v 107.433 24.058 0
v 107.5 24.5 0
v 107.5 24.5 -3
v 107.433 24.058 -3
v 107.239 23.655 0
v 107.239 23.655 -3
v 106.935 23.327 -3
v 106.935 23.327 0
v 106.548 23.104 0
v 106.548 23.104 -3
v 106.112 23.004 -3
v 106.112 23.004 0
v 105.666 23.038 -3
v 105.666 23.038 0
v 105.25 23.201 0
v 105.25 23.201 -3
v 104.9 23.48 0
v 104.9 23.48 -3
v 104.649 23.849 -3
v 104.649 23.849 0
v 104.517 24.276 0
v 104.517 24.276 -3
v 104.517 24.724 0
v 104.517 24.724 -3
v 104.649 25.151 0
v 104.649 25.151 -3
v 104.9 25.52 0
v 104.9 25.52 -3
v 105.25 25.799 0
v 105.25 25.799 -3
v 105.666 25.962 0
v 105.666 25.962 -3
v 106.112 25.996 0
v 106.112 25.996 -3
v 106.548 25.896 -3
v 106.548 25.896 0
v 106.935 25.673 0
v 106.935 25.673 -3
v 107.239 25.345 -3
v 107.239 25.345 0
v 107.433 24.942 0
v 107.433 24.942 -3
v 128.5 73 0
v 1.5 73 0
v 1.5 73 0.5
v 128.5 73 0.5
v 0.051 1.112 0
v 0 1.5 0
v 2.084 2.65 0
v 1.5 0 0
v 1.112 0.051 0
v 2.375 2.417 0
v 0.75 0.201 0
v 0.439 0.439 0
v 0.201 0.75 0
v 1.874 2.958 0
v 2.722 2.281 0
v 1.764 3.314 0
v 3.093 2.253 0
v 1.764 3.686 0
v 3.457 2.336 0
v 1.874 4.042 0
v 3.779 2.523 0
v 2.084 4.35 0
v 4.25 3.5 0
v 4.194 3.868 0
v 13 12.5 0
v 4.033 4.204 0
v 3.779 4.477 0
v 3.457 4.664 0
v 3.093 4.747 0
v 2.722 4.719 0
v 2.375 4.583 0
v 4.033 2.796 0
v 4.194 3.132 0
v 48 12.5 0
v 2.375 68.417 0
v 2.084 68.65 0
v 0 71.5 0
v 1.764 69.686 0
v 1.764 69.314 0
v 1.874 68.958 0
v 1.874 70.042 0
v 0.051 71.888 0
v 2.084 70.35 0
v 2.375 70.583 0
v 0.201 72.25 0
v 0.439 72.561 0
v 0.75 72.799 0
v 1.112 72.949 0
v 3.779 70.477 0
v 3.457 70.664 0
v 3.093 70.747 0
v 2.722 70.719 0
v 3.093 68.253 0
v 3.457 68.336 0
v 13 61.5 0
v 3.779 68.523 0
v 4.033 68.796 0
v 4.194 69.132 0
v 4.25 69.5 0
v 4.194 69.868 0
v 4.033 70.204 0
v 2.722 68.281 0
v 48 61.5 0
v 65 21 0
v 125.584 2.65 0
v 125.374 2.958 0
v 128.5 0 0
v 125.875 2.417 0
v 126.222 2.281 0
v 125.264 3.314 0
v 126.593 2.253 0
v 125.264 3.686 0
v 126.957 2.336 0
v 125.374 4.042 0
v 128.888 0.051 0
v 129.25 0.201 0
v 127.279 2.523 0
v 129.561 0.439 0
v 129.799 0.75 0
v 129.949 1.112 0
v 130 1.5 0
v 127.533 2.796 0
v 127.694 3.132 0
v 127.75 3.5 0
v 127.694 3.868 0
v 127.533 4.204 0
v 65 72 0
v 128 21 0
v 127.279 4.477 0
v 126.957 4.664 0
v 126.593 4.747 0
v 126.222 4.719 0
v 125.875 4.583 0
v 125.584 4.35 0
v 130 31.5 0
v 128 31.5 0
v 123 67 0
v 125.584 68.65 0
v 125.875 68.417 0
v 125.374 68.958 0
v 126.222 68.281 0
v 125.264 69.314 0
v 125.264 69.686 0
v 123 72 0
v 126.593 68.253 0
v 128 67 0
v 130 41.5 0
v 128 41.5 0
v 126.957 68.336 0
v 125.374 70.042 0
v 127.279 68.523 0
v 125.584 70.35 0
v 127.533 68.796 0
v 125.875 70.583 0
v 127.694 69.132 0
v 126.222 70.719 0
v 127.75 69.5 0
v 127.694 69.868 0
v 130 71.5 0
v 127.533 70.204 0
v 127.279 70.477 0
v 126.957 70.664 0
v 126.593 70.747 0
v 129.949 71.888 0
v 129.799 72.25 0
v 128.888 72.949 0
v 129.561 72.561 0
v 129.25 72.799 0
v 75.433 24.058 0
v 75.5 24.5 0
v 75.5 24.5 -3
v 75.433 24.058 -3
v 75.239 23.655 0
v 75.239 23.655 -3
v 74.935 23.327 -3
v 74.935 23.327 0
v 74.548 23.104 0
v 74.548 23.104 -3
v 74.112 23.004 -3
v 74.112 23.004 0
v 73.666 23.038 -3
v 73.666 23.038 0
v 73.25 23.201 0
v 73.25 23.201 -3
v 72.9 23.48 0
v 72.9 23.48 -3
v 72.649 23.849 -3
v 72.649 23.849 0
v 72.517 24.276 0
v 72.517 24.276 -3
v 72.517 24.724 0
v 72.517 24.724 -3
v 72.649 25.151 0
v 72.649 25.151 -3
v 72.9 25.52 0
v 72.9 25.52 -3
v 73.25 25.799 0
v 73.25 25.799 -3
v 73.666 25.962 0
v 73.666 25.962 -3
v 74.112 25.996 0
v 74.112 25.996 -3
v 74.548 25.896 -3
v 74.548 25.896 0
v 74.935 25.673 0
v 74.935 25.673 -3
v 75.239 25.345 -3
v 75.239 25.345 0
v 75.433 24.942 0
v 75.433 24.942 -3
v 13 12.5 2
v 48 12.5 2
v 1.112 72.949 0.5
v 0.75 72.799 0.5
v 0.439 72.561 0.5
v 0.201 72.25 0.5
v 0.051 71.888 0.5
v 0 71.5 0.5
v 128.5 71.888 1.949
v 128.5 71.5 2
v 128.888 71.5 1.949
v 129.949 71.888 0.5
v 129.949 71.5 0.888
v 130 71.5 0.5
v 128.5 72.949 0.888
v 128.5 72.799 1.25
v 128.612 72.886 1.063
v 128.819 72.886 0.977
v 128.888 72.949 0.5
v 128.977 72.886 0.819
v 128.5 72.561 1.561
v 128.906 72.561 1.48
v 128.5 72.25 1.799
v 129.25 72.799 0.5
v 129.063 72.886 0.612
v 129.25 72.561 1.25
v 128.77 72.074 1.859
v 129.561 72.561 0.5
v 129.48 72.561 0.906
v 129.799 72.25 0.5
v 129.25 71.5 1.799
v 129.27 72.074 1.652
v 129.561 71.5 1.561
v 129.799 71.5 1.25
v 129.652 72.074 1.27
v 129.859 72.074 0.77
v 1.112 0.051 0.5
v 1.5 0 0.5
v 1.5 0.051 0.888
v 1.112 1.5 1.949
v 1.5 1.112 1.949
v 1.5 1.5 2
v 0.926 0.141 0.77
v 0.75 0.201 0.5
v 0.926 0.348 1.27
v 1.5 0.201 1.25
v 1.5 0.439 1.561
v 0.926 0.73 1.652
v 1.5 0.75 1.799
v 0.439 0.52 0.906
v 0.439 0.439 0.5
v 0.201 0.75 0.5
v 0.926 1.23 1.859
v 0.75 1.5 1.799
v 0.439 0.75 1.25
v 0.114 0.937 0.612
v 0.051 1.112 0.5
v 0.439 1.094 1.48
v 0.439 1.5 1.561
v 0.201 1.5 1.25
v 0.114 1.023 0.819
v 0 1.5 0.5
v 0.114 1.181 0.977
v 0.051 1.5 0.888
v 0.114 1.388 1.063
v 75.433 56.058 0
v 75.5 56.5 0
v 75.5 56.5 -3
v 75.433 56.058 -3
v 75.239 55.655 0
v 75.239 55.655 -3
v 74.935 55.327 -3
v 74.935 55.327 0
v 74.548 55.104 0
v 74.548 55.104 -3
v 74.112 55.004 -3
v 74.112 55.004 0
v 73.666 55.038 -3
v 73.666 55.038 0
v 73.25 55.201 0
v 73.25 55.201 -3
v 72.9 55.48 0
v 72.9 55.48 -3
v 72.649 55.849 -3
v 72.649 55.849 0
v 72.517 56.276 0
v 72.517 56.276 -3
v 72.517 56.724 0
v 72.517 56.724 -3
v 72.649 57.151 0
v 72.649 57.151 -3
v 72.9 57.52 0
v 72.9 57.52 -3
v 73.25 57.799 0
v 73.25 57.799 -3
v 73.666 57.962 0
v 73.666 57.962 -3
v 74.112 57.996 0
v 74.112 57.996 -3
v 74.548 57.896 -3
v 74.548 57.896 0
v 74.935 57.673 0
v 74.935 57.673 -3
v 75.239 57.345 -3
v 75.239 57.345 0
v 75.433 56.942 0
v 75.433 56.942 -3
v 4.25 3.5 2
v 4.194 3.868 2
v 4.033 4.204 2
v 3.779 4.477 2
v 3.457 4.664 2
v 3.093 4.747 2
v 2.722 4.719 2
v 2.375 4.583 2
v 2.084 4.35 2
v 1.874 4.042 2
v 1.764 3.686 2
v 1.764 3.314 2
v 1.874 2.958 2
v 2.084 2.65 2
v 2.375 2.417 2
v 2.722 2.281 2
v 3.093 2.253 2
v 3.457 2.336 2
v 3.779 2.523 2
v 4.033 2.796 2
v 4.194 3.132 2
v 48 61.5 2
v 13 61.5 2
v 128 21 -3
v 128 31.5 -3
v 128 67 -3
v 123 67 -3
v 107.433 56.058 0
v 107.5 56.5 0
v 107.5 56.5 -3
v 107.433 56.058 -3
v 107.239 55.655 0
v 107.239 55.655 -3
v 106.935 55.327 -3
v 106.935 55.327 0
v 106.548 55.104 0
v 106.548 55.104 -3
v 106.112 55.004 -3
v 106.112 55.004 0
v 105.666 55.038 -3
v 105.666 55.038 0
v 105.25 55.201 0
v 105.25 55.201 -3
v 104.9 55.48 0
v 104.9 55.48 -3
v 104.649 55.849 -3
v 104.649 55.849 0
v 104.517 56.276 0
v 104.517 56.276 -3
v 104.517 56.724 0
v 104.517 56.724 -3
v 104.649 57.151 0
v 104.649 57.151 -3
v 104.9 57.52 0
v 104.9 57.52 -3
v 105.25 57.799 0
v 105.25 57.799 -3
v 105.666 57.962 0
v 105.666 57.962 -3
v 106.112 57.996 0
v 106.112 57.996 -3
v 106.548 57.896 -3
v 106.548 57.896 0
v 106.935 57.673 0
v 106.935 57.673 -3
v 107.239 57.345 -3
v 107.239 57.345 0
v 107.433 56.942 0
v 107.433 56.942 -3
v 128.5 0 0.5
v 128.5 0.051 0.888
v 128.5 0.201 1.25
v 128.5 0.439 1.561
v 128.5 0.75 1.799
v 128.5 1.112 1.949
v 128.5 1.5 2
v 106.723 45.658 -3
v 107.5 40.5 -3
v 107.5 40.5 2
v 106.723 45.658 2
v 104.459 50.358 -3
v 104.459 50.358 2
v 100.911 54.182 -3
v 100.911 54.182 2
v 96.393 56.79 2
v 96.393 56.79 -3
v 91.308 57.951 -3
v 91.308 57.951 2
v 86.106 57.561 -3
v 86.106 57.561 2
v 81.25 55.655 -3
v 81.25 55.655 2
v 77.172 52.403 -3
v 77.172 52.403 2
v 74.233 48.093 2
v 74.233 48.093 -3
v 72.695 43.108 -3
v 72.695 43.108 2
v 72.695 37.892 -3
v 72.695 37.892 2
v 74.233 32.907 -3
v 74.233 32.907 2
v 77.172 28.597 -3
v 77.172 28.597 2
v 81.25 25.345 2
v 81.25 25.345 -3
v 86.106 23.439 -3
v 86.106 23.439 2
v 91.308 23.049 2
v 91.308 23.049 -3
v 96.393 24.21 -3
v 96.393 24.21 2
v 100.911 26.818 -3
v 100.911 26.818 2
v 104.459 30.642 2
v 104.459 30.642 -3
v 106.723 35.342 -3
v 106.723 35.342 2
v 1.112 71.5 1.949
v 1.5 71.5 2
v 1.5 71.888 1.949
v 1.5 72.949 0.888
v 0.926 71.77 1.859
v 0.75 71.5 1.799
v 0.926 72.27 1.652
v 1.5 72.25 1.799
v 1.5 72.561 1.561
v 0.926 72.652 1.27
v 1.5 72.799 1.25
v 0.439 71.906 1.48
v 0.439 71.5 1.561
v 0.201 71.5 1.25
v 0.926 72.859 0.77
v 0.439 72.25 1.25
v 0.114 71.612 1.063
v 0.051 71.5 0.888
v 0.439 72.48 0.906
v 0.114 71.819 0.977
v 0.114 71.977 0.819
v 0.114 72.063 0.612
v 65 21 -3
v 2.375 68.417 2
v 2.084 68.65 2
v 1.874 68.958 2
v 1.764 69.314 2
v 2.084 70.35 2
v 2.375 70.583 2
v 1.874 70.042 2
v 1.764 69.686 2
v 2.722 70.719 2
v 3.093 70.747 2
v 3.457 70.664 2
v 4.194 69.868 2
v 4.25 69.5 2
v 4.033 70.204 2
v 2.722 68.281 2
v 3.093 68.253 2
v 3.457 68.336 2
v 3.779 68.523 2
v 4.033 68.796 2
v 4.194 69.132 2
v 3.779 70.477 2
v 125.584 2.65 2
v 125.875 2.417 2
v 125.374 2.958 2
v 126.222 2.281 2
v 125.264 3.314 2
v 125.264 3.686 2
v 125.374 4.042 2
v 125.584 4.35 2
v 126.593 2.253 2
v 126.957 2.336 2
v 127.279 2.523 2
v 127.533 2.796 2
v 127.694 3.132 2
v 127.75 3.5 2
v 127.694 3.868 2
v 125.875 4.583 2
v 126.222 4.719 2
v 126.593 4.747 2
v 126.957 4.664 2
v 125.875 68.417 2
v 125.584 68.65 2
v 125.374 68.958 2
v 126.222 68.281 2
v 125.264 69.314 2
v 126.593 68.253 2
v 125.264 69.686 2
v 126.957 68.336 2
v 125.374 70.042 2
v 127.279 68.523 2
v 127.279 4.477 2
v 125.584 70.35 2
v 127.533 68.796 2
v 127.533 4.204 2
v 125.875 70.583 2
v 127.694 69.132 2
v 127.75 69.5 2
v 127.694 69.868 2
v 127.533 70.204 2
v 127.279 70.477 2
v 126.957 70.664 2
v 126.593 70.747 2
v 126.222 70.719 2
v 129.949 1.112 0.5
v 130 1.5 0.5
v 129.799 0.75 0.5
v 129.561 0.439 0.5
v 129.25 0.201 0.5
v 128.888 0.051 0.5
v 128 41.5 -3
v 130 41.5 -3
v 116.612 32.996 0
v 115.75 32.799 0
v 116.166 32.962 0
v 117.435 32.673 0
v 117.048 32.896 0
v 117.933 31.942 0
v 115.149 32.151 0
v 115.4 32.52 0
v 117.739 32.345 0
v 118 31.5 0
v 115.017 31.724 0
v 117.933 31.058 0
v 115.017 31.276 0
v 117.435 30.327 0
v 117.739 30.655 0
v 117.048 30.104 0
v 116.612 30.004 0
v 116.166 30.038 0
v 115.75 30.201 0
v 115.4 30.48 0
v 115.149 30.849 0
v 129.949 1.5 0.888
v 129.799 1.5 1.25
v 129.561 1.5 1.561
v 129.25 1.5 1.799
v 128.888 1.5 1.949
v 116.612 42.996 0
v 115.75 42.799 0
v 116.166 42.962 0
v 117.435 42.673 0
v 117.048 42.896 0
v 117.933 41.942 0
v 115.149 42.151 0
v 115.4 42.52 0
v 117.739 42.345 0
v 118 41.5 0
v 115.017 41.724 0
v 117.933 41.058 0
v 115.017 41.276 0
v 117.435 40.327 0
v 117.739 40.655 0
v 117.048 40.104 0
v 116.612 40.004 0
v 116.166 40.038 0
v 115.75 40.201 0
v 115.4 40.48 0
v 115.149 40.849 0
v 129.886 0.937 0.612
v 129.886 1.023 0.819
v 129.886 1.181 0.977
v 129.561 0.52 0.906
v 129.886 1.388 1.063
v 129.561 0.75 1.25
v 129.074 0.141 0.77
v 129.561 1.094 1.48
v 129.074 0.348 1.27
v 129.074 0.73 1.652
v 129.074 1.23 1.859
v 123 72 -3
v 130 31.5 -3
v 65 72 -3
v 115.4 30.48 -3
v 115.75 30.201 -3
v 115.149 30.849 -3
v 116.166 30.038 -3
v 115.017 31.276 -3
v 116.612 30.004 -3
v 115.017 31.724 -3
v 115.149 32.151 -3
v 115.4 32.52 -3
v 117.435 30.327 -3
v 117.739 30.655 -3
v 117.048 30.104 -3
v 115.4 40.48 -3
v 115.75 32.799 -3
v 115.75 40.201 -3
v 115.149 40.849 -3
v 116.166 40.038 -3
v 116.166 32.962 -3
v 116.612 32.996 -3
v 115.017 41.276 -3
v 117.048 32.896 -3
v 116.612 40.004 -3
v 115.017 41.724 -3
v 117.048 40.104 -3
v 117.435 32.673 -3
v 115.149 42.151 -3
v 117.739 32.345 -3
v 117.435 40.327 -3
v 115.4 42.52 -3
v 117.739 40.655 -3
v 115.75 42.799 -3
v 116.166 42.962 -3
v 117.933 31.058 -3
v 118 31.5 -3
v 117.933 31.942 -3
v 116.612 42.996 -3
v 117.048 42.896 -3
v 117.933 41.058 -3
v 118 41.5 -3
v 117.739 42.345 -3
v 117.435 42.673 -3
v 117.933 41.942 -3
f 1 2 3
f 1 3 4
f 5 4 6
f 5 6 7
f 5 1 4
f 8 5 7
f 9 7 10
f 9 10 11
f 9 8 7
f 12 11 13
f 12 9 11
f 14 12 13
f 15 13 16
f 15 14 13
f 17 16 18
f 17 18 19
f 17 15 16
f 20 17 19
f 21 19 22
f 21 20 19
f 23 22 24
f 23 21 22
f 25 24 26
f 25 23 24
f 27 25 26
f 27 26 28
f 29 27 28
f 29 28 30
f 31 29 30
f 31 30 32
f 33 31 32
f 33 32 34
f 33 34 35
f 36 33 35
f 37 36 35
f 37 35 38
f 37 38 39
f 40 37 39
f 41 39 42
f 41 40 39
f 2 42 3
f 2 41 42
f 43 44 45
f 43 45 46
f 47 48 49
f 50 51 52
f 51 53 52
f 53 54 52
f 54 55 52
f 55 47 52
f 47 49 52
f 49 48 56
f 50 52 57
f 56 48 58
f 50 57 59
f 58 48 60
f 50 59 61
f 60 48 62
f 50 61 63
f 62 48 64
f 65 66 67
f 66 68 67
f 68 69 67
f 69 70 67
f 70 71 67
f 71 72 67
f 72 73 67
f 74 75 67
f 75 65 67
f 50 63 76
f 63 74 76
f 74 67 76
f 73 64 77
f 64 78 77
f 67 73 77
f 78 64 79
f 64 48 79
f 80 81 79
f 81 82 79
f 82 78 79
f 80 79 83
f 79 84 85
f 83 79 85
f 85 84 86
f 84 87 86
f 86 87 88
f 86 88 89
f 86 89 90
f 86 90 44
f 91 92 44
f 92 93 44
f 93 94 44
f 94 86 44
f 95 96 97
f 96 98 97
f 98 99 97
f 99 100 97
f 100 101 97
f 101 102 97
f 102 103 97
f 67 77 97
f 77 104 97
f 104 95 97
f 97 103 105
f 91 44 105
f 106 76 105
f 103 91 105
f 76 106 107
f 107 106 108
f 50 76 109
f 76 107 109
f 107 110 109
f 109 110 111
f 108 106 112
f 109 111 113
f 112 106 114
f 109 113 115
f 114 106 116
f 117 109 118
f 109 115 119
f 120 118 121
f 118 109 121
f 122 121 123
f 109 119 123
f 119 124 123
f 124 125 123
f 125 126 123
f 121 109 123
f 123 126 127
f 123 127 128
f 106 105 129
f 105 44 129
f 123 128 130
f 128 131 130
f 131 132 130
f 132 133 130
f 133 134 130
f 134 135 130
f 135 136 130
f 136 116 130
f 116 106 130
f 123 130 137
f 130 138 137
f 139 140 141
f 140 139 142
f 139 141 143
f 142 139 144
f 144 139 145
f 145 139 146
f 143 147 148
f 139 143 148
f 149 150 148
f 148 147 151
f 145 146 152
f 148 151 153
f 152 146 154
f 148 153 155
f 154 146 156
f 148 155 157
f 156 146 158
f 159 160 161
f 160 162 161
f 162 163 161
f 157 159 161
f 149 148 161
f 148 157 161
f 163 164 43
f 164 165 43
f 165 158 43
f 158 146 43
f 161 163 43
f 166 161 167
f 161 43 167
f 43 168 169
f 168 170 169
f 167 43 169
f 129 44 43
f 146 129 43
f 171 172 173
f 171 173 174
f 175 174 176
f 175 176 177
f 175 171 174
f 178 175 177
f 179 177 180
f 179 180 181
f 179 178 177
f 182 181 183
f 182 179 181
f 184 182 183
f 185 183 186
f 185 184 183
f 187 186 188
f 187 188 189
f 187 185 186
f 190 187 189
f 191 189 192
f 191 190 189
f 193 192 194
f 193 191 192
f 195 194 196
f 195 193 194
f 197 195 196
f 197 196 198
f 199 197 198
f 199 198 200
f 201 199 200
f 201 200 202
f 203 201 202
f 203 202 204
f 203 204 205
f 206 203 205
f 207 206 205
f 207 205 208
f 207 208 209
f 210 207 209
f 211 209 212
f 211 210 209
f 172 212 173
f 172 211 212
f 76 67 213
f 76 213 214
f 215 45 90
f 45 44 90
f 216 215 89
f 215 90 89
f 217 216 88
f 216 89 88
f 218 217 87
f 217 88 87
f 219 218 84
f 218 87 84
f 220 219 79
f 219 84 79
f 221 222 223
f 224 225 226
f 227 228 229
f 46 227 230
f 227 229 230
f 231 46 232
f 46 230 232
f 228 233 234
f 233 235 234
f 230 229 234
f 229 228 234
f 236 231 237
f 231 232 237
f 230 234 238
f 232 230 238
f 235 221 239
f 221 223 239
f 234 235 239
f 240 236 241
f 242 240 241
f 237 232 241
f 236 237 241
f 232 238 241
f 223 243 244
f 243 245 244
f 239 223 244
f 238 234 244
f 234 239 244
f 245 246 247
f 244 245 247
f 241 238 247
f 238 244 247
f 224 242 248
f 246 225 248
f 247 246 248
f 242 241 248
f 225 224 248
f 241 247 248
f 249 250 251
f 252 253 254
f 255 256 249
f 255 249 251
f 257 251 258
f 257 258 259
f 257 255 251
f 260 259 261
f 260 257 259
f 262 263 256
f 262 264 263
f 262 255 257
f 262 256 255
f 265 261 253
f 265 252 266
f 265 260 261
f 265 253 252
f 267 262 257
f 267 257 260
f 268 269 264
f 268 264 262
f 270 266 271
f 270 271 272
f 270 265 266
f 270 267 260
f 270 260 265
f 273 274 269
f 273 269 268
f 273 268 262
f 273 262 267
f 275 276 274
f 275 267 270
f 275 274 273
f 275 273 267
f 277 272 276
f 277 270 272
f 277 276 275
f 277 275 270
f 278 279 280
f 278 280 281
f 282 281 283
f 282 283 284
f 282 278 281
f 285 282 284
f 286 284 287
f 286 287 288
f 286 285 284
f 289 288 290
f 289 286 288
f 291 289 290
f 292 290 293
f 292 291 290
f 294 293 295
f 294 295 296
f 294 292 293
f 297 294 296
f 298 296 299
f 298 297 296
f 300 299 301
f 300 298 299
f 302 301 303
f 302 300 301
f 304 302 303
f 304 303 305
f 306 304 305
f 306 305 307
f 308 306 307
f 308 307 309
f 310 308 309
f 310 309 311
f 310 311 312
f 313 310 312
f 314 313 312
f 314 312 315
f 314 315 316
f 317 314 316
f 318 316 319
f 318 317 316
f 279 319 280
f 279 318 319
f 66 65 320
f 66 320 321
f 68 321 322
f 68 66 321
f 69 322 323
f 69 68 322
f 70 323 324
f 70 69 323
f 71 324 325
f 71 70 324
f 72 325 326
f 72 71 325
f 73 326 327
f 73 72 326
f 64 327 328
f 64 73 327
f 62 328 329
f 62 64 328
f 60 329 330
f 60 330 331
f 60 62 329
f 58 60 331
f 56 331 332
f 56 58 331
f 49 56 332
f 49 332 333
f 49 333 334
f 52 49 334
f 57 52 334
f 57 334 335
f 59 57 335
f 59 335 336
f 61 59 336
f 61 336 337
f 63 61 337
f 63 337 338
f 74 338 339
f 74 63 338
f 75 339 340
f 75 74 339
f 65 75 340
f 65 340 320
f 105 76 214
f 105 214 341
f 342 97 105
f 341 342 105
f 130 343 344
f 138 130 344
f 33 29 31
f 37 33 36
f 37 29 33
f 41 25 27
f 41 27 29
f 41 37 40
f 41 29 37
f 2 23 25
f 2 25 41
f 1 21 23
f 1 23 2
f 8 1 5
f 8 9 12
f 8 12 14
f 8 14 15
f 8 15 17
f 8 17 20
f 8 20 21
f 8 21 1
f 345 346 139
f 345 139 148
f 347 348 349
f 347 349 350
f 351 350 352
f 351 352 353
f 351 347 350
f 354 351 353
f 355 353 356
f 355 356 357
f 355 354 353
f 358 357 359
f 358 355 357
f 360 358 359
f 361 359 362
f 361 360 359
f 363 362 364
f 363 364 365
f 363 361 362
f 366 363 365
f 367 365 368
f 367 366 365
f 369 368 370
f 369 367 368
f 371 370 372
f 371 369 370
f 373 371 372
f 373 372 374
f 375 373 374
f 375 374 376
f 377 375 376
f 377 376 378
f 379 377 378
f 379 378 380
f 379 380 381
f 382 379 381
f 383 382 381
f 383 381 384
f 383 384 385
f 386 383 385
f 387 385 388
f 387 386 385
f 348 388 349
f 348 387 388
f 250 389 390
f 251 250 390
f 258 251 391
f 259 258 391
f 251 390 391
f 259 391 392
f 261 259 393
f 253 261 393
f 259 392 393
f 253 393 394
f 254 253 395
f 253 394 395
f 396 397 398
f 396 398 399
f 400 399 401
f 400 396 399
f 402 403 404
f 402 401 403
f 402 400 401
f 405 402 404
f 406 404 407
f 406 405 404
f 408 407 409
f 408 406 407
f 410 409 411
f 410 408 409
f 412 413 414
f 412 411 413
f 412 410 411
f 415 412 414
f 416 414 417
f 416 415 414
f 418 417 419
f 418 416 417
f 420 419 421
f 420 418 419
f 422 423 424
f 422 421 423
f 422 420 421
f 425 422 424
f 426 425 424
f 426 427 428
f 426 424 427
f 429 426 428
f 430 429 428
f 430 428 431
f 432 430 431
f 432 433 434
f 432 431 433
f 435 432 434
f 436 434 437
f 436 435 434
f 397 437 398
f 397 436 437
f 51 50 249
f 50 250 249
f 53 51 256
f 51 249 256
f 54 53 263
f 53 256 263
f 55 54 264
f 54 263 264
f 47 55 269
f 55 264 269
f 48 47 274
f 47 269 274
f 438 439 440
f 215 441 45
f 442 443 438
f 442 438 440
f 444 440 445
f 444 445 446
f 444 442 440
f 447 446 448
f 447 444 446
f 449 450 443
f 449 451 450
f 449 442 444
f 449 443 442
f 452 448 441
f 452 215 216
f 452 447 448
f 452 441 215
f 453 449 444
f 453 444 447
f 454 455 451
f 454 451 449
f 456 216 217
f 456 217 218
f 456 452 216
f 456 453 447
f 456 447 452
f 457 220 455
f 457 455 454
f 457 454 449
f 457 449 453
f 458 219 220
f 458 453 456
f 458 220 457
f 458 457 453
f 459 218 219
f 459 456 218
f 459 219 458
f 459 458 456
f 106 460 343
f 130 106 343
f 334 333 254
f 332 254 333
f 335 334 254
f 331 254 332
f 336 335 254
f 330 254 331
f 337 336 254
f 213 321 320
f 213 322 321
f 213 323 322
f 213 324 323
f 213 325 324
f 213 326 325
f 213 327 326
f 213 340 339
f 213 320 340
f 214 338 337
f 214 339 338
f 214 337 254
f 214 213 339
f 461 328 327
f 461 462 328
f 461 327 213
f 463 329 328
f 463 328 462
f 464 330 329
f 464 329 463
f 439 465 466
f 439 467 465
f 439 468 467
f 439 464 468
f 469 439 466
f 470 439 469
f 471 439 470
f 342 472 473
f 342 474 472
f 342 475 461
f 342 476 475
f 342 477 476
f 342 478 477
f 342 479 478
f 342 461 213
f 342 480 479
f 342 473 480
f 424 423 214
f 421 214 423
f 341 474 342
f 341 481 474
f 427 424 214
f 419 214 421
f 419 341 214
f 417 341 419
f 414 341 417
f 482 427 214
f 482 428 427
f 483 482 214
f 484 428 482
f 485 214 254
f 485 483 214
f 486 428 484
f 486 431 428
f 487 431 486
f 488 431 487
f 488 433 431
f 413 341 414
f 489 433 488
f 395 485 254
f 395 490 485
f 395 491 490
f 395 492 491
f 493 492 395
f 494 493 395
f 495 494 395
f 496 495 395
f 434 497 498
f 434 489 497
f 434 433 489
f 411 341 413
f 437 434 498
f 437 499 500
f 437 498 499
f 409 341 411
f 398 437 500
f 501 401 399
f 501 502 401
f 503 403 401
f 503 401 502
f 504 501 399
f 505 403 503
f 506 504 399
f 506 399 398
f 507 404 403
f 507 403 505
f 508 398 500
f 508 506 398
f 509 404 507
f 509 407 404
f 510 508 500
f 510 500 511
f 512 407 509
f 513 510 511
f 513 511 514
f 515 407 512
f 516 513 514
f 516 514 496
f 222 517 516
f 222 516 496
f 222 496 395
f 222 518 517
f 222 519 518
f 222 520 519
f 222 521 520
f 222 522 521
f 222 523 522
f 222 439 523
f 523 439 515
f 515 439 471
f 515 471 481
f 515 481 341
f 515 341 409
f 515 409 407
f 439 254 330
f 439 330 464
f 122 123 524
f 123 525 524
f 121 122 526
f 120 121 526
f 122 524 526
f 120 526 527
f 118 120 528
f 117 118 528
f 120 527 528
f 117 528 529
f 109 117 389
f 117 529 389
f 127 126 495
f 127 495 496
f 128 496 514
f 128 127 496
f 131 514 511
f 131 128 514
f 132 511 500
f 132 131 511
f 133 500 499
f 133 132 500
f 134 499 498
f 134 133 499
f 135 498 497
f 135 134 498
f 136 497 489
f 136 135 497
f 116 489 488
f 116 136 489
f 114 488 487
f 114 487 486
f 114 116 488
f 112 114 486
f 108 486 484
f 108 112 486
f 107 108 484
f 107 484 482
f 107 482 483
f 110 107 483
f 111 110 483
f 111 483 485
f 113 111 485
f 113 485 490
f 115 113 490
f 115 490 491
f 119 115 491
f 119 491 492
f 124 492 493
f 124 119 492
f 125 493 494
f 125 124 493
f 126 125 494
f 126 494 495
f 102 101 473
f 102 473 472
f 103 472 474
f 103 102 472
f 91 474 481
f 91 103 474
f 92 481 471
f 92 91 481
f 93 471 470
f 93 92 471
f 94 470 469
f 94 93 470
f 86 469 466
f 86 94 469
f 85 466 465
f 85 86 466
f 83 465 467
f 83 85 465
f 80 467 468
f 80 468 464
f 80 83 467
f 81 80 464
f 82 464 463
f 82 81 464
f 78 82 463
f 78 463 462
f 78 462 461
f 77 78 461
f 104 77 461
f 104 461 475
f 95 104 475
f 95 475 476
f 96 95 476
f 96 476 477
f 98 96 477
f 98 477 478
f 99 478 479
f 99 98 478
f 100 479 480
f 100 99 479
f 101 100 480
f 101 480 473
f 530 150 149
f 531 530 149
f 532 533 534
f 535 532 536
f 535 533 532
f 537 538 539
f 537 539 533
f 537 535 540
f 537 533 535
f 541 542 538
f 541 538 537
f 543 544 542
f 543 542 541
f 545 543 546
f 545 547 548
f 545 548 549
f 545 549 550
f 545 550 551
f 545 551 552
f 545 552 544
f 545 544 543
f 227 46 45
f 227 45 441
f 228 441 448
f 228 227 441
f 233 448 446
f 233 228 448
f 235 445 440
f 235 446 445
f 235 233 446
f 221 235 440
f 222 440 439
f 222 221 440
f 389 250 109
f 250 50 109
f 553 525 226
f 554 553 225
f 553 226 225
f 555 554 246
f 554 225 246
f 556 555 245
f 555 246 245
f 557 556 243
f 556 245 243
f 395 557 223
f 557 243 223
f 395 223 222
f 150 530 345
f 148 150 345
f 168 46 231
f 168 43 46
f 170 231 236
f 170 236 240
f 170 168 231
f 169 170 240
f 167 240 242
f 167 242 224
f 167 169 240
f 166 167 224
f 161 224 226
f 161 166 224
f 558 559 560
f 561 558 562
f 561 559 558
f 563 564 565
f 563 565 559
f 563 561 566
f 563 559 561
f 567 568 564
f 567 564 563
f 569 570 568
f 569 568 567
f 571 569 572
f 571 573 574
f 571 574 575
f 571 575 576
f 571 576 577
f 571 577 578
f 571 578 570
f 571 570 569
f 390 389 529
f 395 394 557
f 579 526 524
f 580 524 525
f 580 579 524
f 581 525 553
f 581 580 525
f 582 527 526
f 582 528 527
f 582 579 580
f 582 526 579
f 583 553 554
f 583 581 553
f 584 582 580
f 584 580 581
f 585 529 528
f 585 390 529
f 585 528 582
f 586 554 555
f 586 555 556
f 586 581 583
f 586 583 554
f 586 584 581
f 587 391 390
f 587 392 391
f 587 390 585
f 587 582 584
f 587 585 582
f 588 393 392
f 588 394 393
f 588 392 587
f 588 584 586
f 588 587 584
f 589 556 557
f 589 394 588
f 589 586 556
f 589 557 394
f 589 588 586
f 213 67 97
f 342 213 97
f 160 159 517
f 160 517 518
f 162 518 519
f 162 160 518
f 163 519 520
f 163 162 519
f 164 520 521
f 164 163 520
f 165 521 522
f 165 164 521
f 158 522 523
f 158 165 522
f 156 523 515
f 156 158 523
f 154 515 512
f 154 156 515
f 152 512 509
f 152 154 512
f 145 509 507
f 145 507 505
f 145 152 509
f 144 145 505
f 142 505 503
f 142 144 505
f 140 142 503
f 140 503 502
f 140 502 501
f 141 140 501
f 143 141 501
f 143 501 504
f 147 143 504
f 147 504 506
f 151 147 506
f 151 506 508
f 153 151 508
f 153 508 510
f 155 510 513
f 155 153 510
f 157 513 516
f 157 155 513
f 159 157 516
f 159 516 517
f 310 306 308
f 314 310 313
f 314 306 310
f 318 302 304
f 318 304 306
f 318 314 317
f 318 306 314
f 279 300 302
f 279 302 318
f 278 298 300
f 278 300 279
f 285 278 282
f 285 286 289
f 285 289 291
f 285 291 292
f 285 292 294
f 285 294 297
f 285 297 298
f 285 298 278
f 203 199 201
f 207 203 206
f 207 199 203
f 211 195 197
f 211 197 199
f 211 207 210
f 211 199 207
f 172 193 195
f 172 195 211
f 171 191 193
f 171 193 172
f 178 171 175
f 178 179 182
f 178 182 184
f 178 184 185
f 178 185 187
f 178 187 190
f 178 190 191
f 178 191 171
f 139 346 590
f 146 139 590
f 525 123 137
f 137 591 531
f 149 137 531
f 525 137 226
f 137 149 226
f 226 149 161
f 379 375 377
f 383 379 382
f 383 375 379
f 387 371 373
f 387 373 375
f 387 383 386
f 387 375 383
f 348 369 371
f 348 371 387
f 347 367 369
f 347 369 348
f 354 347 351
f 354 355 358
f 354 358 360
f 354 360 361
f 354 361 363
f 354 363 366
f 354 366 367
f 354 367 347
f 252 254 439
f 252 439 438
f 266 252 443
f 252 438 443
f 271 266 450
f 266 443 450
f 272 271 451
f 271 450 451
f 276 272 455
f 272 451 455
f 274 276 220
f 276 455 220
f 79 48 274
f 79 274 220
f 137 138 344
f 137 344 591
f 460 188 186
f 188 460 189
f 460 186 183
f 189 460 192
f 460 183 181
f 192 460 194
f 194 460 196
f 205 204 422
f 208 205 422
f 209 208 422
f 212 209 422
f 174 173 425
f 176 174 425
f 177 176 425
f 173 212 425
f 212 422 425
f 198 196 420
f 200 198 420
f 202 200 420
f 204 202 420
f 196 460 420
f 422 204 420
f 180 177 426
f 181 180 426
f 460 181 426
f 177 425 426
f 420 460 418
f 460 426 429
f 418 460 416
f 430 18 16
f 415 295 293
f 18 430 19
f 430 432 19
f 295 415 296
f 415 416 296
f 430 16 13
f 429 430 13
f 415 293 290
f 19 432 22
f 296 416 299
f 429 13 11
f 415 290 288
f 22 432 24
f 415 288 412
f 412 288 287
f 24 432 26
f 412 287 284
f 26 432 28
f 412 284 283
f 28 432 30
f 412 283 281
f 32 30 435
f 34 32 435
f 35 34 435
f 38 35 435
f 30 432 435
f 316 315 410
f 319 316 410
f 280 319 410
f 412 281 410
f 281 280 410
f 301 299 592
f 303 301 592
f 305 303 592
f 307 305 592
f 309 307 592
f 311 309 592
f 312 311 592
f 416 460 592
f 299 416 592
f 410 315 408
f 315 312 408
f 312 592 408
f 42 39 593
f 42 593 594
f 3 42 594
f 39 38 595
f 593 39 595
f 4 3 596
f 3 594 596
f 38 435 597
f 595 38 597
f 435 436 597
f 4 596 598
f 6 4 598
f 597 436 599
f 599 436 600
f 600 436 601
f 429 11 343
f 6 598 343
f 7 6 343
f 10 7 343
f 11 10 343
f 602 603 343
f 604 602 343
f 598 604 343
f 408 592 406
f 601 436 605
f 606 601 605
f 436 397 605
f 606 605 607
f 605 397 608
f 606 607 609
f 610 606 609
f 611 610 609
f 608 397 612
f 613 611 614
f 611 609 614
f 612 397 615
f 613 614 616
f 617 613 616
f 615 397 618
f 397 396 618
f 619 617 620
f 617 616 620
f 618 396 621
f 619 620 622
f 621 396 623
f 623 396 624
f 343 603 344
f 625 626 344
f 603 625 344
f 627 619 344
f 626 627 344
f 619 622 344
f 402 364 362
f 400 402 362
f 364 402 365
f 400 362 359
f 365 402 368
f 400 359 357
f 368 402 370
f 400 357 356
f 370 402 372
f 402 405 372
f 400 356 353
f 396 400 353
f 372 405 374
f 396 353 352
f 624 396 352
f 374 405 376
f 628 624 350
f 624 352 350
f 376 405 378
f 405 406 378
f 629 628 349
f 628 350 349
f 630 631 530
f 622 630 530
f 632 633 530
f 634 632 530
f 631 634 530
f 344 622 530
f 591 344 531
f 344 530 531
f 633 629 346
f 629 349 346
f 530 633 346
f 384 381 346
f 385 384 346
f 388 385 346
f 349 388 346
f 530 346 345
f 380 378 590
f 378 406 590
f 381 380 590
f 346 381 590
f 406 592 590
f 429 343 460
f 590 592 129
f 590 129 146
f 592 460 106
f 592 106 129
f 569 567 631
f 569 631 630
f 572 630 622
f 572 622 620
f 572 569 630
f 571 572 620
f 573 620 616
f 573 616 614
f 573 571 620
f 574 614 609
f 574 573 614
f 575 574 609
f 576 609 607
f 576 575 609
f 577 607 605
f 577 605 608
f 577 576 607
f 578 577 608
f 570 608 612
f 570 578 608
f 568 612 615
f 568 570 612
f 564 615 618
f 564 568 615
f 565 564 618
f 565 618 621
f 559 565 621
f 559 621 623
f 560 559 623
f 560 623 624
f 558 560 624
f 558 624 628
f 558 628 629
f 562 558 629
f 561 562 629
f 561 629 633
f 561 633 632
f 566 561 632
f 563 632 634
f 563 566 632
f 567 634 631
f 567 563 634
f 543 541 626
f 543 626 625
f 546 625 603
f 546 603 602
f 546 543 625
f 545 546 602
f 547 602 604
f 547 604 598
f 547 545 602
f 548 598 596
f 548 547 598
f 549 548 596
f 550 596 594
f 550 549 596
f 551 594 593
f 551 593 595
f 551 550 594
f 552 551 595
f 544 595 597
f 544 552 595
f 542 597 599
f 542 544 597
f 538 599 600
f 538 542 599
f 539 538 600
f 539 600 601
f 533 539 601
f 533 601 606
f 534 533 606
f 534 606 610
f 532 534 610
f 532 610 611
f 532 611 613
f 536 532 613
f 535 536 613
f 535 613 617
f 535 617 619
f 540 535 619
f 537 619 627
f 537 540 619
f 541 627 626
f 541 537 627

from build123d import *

# Parameters (mm, degrees)
BOX_W             = 130
BOX_H             = 73
BOX_DEPTH         = 2
BOX001_W          = 35
BOX001_H          = 49
BOX001_DEPTH      = 4
CYLINDER_R        = 17.5
CYLINDER_DEPTH    = 14
BOX002_W          = 63
BOX002_H          = 51
BOX002_DEPTH      = 3
CYLINDER001_R     = 17.5
CYLINDER001_DEPTH = 10
CYLINDER002_R     = 1.5
CYLINDER002_DEPTH = 3
CYLINDER003_R     = 1.5
CYLINDER003_DEPTH = 3
CYLINDER004_R     = 1.5
CYLINDER004_DEPTH = 3
CYLINDER005_R     = 1.5
CYLINDER005_DEPTH = 3
CYLINDER006_R     = 1.5
CYLINDER006_DEPTH = 3
CYLINDER007_R     = 1.5
CYLINDER007_DEPTH = 3
BOX003_W          = 2
BOX003_H          = 10
BOX003_DEPTH      = 3
BOX004_W          = 5
BOX004_H          = 5
BOX004_DEPTH      = 3
CYLINDER008_R     = 1.25
CYLINDER008_DEPTH = 2
CYLINDER009_R     = 1.25
CYLINDER009_DEPTH = 2
CYLINDER010_R     = 1.25
CYLINDER010_DEPTH = 2
CYLINDER011_R     = 1.25
CYLINDER011_DEPTH = 2
FILLET_R          = 1.5
FILLET001_R       = 1.5
FILLET002_R       = 1.5
FILLET003_R       = 1.5


with BuildPart() as part:
    # Box → Box (join)
    with BuildSketch(Plane.XY):
        with Locations((65, 36.5)):
            Rectangle(BOX_W, BOX_H)
    extrude(amount=BOX_DEPTH)

    # Box001 → Box001 (cut)
    with BuildSketch(Plane(origin=(13, 12.5, -2), x_dir=(1, 0, 0), z_dir=(0, 0, 1))):
        with Locations((17.5, 24.5)):
            Rectangle(BOX001_W, BOX001_H)
    extrude(amount=BOX001_DEPTH, mode=Mode.SUBTRACT)

    # Cylinder → Cylinder (cut)
    with BuildSketch(Plane(origin=(90, 40.5, -6), x_dir=(1, 0, 0), z_dir=(0, 0, 1))):
        Circle(CYLINDER_R)
    extrude(amount=CYLINDER_DEPTH, mode=Mode.SUBTRACT)

    # Box002 → Box002 (join)
    with BuildSketch(Plane(origin=(65, 21, -3), x_dir=(1, 0, 0), z_dir=(0, 0, 1))):
        with Locations((31.5, 25.5)):
            Rectangle(BOX002_W, BOX002_H)
    extrude(amount=BOX002_DEPTH)

    # Cylinder001 → Cylinder001 (cut)
    with BuildSketch(Plane(origin=(90, 40.5, -5), x_dir=(1, 0, 0), z_dir=(0, 0, 1))):
        Circle(CYLINDER001_R)
    extrude(amount=CYLINDER001_DEPTH, mode=Mode.SUBTRACT)

    # Cylinder002 → Cylinder002 (cut)
    with BuildSketch(Plane(origin=(106, 24.5, 0), x_dir=(1, 0, 0), z_dir=(0, 0, -1))):
        Circle(CYLINDER002_R)
    extrude(amount=CYLINDER002_DEPTH, mode=Mode.SUBTRACT)

    # Cylinder003 → Cylinder003 (cut)
    with BuildSketch(Plane(origin=(74, 24.5, 0), x_dir=(1, 0, 0), z_dir=(0, 0, -1))):
        Circle(CYLINDER003_R)
    extrude(amount=CYLINDER003_DEPTH, mode=Mode.SUBTRACT)

    # Cylinder004 → Cylinder004 (cut)
    with BuildSketch(Plane(origin=(74, 56.5, 0), x_dir=(1, 0, 0), z_dir=(0, 0, -1))):
        Circle(CYLINDER004_R)
    extrude(amount=CYLINDER004_DEPTH, mode=Mode.SUBTRACT)

    # Cylinder005 → Cylinder005 (cut)
    with BuildSketch(Plane(origin=(106, 56.5, 0), x_dir=(1, 0, 0), z_dir=(0, 0, -1))):
        Circle(CYLINDER005_R)
    extrude(amount=CYLINDER005_DEPTH, mode=Mode.SUBTRACT)

    # Cylinder006 → Cylinder006 (cut)
    with BuildSketch(Plane(origin=(116.5, 41.5, 0), x_dir=(1, 0, 0), z_dir=(0, 0, -1))):
        Circle(CYLINDER006_R)
    extrude(amount=CYLINDER006_DEPTH, mode=Mode.SUBTRACT)

    # Cylinder007 → Cylinder007 (cut)
    with BuildSketch(Plane(origin=(116.5, 31.5, 0), x_dir=(1, 0, 0), z_dir=(0, 0, -1))):
        Circle(CYLINDER007_R)
    extrude(amount=CYLINDER007_DEPTH, mode=Mode.SUBTRACT)

    # Box003 → Box003 (join)
    with BuildSketch(Plane(origin=(128, 41.5, 0), x_dir=(1, 0, 0), z_dir=(0, 0, -1))):
        with Locations((1, 5)):
            Rectangle(BOX003_W, BOX003_H)
    extrude(amount=BOX003_DEPTH)

    # Box004 → Box004 (cut)
    with BuildSketch(Plane(origin=(123, 67, -3), x_dir=(1, 0, 0), z_dir=(0, 0, 1))):
        with Locations((2.5, 2.5)):
            Rectangle(BOX004_W, BOX004_H)
    extrude(amount=BOX004_DEPTH, mode=Mode.SUBTRACT)

    # Cylinder008 → Cylinder008 (cut)
    with BuildSketch(Plane(origin=(3, 69.5, 0), x_dir=(1, 0, 0), z_dir=(0, 0, 1))):
        Circle(CYLINDER008_R)
    extrude(amount=CYLINDER008_DEPTH, mode=Mode.SUBTRACT)

    # Cylinder009 → Cylinder009 (cut)
    with BuildSketch(Plane(origin=(3, 3.5, 0), x_dir=(1, 0, 0), z_dir=(0, 0, 1))):
        Circle(CYLINDER009_R)
    extrude(amount=CYLINDER009_DEPTH, mode=Mode.SUBTRACT)

    # Cylinder010 → Cylinder010 (cut)
    with BuildSketch(Plane(origin=(126.5, 3.5, 0), x_dir=(1, 0, 0), z_dir=(0, 0, 1))):
        Circle(CYLINDER010_R)
    extrude(amount=CYLINDER010_DEPTH, mode=Mode.SUBTRACT)

    # Cylinder011 → Cylinder011 (cut)
    with BuildSketch(Plane(origin=(126.5, 69.5, 0), x_dir=(1, 0, 0), z_dir=(0, 0, 1))):
        Circle(CYLINDER011_R)
    extrude(amount=CYLINDER011_DEPTH, mode=Mode.SUBTRACT)

    # Fillet
    fillet_edges = [part.edges().sort_by_distance(p)[0] for p in [
        (65, 0, 2),
    ]]
    fillet(fillet_edges, radius=FILLET_R)

    # Fillet001
    fillet001_edges = [part.edges().sort_by_distance(p)[0] for p in [
        (130, 37.25, 2),
    ]]
    fillet(fillet001_edges, radius=FILLET001_R)

    # Fillet002
    fillet002_edges = [part.edges().sort_by_distance(p)[0] for p in [
        (64.25, 73, 2),
    ]]
    fillet(fillet002_edges, radius=FILLET002_R)

    # Fillet003
    fillet003_edges = [part.edges().sort_by_distance(p)[0] for p in [
        (0, 36.5, 2),
    ]]
    fillet(fillet003_edges, radius=FILLET003_R)


solid = part.part
